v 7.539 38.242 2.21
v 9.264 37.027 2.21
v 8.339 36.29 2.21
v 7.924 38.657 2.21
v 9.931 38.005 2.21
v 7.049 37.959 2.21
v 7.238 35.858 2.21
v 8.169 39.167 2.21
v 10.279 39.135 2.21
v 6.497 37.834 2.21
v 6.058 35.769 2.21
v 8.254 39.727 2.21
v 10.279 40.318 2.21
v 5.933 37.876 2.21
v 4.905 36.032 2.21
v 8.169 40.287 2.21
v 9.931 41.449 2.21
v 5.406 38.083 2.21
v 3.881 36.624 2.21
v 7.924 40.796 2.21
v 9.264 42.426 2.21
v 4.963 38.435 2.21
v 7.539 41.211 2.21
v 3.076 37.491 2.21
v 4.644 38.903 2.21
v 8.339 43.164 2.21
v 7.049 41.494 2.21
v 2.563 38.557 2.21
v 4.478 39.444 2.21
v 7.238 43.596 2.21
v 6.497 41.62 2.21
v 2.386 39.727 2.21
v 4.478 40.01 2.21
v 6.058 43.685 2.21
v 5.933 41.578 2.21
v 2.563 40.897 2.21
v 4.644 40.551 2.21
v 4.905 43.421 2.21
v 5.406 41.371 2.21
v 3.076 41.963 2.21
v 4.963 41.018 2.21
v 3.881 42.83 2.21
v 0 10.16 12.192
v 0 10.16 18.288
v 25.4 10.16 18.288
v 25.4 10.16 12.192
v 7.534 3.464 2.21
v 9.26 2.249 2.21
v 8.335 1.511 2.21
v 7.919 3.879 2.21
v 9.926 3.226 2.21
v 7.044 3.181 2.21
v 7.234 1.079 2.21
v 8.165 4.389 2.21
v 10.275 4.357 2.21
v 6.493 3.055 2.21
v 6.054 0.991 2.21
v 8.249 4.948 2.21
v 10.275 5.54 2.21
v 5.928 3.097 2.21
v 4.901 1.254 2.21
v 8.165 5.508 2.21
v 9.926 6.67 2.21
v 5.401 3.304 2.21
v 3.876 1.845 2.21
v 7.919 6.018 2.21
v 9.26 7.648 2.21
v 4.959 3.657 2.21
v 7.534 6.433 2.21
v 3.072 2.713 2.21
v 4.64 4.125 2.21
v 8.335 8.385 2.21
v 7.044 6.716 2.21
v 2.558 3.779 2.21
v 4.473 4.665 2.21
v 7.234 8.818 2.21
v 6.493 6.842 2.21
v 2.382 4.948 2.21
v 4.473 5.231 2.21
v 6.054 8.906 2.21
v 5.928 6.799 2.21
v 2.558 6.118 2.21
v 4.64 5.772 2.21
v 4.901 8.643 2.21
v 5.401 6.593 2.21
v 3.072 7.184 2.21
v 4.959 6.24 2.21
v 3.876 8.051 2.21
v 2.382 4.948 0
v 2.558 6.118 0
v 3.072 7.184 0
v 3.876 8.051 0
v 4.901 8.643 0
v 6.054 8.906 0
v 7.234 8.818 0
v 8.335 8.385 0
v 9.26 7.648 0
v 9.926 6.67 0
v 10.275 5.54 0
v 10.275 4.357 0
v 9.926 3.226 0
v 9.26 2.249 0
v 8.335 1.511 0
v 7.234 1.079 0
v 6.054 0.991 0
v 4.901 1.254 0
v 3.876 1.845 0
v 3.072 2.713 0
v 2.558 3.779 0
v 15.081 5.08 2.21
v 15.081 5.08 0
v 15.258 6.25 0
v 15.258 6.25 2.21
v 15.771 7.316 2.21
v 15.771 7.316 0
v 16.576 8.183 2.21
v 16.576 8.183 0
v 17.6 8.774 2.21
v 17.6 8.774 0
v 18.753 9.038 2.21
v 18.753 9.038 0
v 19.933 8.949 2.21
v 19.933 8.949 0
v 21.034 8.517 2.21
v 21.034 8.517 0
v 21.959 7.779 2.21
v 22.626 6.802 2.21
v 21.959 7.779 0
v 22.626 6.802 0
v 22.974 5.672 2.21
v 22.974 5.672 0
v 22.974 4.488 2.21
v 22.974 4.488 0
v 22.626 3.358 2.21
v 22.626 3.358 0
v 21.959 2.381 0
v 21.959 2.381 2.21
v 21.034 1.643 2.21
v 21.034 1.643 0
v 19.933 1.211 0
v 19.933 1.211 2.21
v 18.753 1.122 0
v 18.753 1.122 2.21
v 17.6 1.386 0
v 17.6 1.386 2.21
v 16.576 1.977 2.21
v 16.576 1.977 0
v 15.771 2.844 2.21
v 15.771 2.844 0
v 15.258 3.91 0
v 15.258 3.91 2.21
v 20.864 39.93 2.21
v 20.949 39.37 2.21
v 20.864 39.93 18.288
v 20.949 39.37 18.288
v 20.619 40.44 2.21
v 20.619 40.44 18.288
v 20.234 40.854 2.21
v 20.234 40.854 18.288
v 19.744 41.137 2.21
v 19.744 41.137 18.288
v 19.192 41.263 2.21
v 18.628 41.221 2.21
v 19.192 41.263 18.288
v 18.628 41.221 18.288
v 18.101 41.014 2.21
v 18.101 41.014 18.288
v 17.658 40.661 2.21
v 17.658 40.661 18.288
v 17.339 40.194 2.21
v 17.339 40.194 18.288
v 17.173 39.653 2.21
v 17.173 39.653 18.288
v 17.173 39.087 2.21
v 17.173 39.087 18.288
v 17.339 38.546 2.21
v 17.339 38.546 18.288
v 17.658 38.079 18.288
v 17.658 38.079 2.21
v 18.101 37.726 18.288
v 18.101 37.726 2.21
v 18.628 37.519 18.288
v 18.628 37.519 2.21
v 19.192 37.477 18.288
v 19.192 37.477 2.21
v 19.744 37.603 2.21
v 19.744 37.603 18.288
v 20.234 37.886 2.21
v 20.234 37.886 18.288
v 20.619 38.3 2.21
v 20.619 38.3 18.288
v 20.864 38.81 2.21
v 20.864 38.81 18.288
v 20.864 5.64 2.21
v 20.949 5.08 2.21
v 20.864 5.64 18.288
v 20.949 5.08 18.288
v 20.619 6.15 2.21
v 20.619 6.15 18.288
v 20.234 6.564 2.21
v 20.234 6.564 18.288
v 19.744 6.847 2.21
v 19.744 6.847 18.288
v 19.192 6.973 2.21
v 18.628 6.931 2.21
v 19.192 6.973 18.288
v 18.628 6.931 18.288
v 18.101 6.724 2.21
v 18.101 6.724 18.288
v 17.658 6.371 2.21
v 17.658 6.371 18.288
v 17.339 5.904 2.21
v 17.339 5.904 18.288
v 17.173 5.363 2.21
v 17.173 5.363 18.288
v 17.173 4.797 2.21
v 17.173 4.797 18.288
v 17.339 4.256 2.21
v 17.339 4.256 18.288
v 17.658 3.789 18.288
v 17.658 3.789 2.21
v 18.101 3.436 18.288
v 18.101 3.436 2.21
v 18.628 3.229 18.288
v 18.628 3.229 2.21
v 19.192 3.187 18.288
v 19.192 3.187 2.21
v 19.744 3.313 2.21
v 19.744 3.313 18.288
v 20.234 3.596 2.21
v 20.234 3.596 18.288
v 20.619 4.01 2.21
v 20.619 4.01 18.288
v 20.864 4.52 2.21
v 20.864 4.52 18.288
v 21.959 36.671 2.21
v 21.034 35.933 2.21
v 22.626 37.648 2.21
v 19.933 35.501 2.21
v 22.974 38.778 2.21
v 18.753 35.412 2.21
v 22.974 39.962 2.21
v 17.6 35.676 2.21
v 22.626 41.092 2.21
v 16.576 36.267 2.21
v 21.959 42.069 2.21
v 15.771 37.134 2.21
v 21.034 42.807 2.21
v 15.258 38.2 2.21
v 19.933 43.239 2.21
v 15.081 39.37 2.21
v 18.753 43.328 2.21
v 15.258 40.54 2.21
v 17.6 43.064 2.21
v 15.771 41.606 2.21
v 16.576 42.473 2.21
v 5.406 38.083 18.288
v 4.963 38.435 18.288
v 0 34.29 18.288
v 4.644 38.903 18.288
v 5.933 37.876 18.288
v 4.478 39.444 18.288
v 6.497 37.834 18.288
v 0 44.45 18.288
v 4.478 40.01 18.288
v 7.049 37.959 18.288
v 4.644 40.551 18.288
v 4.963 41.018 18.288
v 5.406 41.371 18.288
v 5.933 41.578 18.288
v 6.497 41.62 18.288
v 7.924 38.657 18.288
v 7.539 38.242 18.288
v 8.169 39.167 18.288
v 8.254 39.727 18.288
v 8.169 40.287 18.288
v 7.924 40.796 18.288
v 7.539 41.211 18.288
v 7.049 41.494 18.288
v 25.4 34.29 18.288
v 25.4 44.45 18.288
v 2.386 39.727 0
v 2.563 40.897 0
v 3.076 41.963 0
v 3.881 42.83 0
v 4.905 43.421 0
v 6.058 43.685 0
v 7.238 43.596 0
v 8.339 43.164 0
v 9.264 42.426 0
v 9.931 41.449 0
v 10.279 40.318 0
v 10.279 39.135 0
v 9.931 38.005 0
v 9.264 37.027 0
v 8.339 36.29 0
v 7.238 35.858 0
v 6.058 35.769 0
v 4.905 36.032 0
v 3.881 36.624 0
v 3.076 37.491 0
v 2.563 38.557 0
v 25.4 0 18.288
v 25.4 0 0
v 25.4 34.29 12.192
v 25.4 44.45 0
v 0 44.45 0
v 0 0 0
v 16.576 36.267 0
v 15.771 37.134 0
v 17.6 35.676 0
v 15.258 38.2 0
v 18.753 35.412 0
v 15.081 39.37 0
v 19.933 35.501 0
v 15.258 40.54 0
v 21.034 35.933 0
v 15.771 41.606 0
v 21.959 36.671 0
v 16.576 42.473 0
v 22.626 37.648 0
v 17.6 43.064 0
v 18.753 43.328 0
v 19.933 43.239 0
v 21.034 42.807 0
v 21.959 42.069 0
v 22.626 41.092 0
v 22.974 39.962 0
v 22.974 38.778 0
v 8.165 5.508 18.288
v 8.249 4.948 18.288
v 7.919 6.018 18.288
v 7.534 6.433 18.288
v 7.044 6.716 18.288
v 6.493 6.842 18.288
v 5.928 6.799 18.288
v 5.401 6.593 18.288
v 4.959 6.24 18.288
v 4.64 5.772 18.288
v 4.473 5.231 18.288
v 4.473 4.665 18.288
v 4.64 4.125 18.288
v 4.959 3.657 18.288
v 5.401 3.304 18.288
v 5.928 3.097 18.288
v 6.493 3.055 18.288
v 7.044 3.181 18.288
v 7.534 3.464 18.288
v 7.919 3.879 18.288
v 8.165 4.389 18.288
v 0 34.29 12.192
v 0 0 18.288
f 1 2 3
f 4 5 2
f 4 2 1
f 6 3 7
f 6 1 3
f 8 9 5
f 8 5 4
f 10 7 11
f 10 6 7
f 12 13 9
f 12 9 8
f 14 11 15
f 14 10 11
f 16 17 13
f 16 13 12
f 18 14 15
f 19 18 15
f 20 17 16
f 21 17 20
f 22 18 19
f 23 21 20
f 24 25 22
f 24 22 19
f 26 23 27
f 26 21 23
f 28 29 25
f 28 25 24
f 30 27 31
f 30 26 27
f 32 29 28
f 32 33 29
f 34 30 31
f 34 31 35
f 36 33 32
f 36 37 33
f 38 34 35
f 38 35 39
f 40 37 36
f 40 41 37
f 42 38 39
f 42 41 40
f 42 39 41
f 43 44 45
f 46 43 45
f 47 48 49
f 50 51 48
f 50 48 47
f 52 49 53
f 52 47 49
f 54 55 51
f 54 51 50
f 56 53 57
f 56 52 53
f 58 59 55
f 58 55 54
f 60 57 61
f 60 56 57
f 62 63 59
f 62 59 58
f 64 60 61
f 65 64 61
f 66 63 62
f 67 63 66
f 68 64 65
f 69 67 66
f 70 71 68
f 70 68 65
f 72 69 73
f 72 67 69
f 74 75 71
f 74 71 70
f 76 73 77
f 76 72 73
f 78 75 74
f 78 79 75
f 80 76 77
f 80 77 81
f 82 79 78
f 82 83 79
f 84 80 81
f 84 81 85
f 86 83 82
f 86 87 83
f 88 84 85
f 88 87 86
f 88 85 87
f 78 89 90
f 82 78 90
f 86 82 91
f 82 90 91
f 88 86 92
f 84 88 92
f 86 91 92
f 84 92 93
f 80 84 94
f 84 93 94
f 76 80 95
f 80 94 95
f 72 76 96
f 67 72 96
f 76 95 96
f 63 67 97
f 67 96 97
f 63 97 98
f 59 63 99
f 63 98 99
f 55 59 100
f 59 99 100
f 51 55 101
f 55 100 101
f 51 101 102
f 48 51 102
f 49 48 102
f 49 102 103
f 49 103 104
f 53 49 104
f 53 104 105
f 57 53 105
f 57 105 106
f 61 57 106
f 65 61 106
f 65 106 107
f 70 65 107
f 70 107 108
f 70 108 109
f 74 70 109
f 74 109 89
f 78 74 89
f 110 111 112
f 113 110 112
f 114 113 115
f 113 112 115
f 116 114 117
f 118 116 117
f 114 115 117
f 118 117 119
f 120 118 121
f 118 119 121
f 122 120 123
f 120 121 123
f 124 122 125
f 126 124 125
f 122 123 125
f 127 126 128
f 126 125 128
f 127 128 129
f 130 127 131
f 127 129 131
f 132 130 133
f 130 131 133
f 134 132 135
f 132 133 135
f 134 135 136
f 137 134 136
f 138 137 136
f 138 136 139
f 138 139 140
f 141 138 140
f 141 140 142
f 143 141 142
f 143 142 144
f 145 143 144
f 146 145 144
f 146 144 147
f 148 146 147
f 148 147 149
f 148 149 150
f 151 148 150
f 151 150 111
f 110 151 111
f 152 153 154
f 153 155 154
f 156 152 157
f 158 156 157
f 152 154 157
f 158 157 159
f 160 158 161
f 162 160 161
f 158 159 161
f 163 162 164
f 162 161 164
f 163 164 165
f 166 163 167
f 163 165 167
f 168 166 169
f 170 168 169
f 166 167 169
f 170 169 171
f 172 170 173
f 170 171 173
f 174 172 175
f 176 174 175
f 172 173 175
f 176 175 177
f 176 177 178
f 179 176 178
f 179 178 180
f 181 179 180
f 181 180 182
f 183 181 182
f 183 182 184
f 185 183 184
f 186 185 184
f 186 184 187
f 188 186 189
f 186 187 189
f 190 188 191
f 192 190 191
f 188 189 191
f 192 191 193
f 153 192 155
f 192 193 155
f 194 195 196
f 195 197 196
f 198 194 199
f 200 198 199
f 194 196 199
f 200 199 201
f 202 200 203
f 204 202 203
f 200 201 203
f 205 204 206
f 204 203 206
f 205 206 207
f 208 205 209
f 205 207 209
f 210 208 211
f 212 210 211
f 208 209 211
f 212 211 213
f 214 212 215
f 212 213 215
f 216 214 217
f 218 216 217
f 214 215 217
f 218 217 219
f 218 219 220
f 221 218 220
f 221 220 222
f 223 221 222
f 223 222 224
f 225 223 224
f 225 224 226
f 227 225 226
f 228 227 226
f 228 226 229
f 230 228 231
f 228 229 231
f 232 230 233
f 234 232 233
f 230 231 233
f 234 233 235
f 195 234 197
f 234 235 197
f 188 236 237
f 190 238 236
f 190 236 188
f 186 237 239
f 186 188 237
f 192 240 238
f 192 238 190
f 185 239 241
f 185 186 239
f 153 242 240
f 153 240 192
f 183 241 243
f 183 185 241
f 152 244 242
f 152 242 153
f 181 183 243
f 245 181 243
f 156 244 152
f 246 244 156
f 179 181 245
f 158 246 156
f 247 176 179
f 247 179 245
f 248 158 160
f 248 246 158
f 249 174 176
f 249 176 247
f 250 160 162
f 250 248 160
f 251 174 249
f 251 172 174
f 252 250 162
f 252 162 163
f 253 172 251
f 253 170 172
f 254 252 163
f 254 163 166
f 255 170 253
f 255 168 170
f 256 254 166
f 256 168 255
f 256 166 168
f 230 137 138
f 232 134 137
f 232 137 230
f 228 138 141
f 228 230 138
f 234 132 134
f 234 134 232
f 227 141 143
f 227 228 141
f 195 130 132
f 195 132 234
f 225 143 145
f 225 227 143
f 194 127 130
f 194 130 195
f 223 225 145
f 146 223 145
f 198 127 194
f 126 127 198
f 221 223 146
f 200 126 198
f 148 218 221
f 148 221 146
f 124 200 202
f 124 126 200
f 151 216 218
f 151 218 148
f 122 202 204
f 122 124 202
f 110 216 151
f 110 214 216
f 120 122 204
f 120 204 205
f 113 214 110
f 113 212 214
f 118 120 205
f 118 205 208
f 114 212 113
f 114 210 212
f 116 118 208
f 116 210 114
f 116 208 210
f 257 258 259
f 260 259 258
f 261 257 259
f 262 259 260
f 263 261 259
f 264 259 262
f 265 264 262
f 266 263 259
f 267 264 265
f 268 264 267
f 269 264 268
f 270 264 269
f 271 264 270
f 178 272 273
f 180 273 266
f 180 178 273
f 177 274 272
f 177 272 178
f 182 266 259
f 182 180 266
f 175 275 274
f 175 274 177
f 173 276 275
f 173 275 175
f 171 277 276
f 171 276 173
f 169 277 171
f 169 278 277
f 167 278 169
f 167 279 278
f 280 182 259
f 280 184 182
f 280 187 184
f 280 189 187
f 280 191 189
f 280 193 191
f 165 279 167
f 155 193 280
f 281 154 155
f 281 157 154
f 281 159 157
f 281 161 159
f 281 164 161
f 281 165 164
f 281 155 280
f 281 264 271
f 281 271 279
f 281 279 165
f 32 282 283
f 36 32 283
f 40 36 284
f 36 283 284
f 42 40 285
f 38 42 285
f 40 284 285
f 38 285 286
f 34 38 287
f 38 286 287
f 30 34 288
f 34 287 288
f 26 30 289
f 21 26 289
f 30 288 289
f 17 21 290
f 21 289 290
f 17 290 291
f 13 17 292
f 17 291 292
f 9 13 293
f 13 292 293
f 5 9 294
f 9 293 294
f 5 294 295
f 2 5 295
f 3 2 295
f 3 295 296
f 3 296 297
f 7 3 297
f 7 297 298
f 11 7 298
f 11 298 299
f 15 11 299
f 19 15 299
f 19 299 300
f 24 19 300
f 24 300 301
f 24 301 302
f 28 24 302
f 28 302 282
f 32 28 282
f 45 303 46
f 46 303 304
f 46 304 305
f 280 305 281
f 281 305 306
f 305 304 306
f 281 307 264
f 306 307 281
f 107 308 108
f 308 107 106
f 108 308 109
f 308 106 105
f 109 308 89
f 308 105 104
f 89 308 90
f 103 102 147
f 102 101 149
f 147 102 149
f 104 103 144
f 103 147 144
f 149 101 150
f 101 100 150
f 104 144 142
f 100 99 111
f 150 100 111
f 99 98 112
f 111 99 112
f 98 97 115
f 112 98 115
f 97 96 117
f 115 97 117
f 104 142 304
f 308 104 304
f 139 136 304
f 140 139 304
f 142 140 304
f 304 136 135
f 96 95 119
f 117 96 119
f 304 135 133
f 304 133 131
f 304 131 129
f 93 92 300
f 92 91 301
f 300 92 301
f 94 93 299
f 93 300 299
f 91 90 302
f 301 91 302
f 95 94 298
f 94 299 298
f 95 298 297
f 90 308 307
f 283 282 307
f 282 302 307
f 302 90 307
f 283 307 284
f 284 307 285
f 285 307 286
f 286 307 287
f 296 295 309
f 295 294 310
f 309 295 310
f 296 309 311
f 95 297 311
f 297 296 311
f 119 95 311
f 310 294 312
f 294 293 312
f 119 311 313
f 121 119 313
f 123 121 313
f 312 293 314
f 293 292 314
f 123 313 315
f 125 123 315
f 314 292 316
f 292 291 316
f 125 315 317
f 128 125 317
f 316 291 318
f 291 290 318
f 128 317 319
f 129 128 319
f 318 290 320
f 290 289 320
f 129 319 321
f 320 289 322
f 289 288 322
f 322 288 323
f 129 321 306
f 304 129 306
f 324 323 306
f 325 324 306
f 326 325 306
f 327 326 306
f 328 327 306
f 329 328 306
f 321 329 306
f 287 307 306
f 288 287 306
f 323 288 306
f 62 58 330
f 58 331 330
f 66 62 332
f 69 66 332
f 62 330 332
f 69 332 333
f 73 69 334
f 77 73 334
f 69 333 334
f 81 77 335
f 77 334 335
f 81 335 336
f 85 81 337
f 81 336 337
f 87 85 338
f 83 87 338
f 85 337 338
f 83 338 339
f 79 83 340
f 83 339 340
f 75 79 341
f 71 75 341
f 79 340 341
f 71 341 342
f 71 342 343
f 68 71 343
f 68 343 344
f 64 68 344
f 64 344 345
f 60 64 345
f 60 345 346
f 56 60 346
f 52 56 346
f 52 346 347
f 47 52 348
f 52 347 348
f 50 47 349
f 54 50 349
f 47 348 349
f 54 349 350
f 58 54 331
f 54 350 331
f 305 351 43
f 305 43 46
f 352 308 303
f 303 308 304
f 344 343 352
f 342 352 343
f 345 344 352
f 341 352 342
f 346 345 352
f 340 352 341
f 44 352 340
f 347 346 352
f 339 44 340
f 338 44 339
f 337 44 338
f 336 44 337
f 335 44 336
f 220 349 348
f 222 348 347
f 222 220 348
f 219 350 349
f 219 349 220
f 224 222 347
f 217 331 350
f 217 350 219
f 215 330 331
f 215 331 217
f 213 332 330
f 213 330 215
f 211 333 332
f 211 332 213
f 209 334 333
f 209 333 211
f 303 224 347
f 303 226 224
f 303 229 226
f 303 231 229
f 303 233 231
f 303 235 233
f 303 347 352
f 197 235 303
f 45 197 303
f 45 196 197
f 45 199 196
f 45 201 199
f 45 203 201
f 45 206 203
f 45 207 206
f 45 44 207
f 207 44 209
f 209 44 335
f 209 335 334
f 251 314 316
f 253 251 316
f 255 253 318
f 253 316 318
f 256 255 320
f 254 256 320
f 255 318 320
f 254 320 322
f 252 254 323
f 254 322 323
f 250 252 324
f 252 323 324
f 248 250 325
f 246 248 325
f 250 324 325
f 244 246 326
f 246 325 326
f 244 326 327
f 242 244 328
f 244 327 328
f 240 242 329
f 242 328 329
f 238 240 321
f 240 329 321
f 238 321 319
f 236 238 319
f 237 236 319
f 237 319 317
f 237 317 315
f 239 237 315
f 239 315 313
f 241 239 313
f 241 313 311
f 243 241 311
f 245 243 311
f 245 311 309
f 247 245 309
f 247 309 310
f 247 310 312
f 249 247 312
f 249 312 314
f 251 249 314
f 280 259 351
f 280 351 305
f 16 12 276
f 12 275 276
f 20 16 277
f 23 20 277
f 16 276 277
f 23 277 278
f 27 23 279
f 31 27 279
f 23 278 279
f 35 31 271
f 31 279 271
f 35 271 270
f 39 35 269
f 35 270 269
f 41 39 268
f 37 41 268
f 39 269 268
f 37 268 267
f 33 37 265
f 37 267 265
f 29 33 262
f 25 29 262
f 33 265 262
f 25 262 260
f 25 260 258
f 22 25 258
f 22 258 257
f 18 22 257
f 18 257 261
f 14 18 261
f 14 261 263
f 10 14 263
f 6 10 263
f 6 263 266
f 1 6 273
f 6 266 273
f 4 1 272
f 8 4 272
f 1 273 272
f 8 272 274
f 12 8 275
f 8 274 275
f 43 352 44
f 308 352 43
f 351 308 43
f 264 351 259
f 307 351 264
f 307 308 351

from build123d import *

# Parameters (mm, degrees)
SKETCH1_W                                           = 25.4
SKETCH1_H                                           = 44.45
BOSS_EXTRUDE2_DEPTH                                 = 18.288
SKETCH3_W                                           = 25.4
SKETCH3_H                                           = 24.13
CUT_EXTRUDE1_DEPTH                                  = 6.096
CBORE_FOR_6_BINDING_HEAD_MACHINE_SCREW1_D           = 3.7973
CBORE_FOR_6_BINDING_HEAD_MACHINE_SCREW1_CBORE_D     = 7.9375
CBORE_FOR_6_BINDING_HEAD_MACHINE_SCREW1_CBORE_DEPTH = 2.2098


with BuildPart() as part:
    # Sketch1 → Boss-Extrude2 (new body)
    with BuildSketch(Plane.XY):
        with Locations((12.7, 22.225)):
            Rectangle(SKETCH1_W, SKETCH1_H)
    extrude(amount=BOSS_EXTRUDE2_DEPTH)

    # Sketch3 → Cut-Extrude1 (cut)
    with BuildSketch(Plane.XY.offset(18.288)):
        with Locations((12.7, 22.225)):
            Rectangle(SKETCH3_W, SKETCH3_H)
    extrude(amount=-CUT_EXTRUDE1_DEPTH, mode=Mode.SUBTRACT)

    # CBORE for #6 Binding Head Machine Screw1 (through all)
    with Locations(Plane(origin=(19.05, 5.08, 0), x_dir=(-1, 0, 0), z_dir=(0, 0, -1))):
        with Locations((0, 0), (12.699317265, -0.131685219), (0, 34.29), (12.694984111, 34.646901144)):
            CounterBoreHole(CBORE_FOR_6_BINDING_HEAD_MACHINE_SCREW1_D / 2, CBORE_FOR_6_BINDING_HEAD_MACHINE_SCREW1_CBORE_D / 2, CBORE_FOR_6_BINDING_HEAD_MACHINE_SCREW1_CBORE_DEPTH)


solid = part.part
